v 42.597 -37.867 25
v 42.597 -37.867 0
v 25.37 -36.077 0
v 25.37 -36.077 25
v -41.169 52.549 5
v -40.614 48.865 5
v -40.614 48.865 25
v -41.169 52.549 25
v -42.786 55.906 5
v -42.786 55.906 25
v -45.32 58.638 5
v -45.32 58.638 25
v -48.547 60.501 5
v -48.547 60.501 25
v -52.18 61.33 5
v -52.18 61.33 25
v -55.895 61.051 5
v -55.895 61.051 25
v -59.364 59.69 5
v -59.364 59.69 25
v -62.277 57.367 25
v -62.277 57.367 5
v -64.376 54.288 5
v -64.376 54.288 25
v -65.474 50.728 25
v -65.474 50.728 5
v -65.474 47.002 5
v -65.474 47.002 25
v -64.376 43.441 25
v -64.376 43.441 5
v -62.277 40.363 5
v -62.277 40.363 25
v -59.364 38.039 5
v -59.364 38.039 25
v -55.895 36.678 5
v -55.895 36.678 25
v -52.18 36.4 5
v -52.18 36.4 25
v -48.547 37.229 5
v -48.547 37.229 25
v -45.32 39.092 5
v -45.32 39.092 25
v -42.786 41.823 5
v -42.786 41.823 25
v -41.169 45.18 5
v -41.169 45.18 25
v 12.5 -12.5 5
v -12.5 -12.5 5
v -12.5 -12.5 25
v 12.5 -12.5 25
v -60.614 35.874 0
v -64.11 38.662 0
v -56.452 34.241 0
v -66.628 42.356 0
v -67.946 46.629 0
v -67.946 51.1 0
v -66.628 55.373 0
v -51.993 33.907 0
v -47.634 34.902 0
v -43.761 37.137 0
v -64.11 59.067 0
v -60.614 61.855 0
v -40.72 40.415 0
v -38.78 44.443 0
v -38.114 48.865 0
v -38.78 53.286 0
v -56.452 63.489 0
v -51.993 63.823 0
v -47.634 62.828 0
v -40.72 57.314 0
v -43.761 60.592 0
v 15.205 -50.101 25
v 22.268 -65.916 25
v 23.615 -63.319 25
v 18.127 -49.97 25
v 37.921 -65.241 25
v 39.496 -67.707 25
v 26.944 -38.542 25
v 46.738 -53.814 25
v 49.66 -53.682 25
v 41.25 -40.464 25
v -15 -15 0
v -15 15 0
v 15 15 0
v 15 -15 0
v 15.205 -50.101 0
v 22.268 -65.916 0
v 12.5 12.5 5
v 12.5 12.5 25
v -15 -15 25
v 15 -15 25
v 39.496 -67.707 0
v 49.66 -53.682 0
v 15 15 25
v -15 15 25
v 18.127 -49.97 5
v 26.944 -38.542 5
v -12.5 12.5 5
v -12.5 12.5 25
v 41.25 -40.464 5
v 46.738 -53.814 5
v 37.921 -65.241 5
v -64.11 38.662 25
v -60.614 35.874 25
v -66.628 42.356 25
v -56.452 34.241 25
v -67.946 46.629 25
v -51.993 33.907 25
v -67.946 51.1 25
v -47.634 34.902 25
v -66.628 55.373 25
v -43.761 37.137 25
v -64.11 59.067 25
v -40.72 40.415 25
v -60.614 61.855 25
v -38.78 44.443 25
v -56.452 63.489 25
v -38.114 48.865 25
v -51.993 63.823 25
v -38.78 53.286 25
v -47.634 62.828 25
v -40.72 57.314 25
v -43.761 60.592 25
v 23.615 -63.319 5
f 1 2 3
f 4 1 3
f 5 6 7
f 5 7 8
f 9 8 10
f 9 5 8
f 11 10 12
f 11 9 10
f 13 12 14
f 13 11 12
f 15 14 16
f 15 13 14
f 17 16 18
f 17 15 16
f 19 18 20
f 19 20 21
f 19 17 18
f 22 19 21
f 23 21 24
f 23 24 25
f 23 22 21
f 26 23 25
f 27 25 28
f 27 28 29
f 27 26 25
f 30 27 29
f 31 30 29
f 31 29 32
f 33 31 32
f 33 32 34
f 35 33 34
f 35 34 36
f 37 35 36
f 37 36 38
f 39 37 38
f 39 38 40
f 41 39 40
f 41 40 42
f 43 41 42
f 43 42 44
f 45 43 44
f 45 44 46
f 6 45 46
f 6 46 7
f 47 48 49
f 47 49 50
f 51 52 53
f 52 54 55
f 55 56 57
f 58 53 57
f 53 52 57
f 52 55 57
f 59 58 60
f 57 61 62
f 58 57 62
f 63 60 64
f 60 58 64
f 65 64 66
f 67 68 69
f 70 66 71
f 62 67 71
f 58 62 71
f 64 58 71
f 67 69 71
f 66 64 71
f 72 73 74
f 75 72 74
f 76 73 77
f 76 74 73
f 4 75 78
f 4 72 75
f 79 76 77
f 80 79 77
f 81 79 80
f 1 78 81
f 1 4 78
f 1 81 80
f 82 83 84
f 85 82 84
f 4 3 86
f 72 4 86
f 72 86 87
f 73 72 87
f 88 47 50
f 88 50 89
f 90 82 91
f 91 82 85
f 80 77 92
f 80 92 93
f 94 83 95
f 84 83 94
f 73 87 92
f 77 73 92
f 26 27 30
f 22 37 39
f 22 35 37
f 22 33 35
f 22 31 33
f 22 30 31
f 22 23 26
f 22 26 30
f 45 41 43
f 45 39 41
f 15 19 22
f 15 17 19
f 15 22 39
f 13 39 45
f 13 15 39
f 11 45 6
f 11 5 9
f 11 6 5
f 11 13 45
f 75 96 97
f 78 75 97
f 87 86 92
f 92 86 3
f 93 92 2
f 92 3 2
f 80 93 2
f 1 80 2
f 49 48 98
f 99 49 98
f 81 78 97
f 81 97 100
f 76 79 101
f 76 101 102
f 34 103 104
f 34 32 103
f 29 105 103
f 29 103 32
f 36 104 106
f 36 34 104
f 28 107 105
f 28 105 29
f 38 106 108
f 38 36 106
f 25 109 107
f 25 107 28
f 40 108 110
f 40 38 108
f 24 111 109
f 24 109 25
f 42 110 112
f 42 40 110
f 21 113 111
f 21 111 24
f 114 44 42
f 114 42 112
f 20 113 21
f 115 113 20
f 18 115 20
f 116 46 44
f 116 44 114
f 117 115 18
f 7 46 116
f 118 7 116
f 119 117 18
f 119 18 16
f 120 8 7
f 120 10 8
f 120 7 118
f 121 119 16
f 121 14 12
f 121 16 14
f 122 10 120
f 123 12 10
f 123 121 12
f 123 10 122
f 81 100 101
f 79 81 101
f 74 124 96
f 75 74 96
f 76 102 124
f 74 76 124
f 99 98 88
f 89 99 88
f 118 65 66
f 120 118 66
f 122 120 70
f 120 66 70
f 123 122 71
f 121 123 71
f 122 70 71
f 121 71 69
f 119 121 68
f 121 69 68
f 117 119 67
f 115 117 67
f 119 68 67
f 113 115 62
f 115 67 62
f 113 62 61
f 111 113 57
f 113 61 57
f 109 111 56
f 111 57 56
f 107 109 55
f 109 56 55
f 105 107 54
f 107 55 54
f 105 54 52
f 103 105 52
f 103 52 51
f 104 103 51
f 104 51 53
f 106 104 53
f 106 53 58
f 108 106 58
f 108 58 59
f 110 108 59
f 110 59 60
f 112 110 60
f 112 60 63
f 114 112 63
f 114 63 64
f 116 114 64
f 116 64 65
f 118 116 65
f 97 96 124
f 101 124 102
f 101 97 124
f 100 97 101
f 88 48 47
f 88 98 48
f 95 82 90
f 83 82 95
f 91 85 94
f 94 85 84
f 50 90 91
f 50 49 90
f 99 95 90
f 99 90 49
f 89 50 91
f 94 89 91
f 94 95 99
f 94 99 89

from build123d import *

# Parameters (mm, degrees)
F0_W     = 30
F0_H     = 30
F0_W_2   = 25
F0_H_2   = 25
F1_DEPTH = 5
F2_DEPTH = 25
F3_R     = 15
F3_R_2   = 12.5
F4_DEPTH = 5
F5_DEPTH = 25
F7_DEPTH = 5
F8_DEPTH = 25


with BuildPart() as f1:
    # F0 (on Top) → F1 (new body)
    with BuildSketch(Plane.XY):
        Rectangle(F0_W, F0_H)
        Rectangle(F0_W_2, F0_H_2, mode=Mode.SUBTRACT)
        Rectangle(F0_W_2, F0_H_2)
    extrude(amount=F1_DEPTH)

    # F0 (on Top) → F2 (join)
    with BuildSketch(Plane.XY):
        Rectangle(F0_W, F0_H)
        Rectangle(F0_W_2, F0_H_2, mode=Mode.SUBTRACT)
    extrude(amount=F2_DEPTH)


with BuildPart() as f4:
    # F3 (on Top) → F4 (new body)
    with BuildSketch(Plane.XY):
        with Locations((-53.1137622893, 48.8646626472)):
            Circle(F3_R)
        with Locations((-53.1137622893, 48.8646626472)):
            Circle(F3_R_2, mode=Mode.SUBTRACT)
        with Locations((-53.1137622893, 48.8646626472)):
            Circle(F3_R_2)
    extrude(amount=F4_DEPTH)

    # F3 (on Top) → F5 (join)
    with BuildSketch(Plane.XY):
        with Locations((-53.1137622893, 48.8646626472)):
            Circle(F3_R)
        with Locations((-53.1137622893, 48.8646626472)):
            Circle(F3_R_2, mode=Mode.SUBTRACT)
    extrude(amount=F5_DEPTH)


with BuildPart() as f7:
    # F6 (on Top) → F7 (new body)
    with BuildSketch(Plane.XY):
        Polygon((15.2048393161, -50.1008412448), (22.2678444807, -65.9158328049), (39.4955315147, -67.7065866852), (49.660213384, -53.6823490056), (42.5972082193, -37.8673574455), (25.3695211854, -36.0766035652), align=None)
        Polygon((37.9207151216, -65.2412437101), (23.6154859297, -63.3193303146), (18.1272971581, -49.9696817297), (26.9443375785, -38.5419465403), (41.2495667704, -40.4638599358), (46.7377555419, -53.8135085207), align=None, mode=Mode.SUBTRACT)
        Polygon((18.1272971581, -49.9696817297), (23.6154859297, -63.3193303146), (37.9207151216, -65.2412437101), (46.7377555419, -53.8135085207), (41.2495667704, -40.4638599358), (26.9443375785, -38.5419465403), align=None)
    extrude(amount=F7_DEPTH)

    # F6 (on Top) → F8 (join)
    with BuildSketch(Plane.XY):
        Polygon((15.2048393161, -50.1008412448), (22.2678444807, -65.9158328049), (39.4955315147, -67.7065866852), (49.660213384, -53.6823490056), (42.5972082193, -37.8673574455), (25.3695211854, -36.0766035652), align=None)
        Polygon((37.9207151216, -65.2412437101), (23.6154859297, -63.3193303146), (18.1272971581, -49.9696817297), (26.9443375785, -38.5419465403), (41.2495667704, -40.4638599358), (46.7377555419, -53.8135085207), align=None, mode=Mode.SUBTRACT)
    extrude(amount=F8_DEPTH)


solid = Compound([f1.part, f4.part, f7.part])
